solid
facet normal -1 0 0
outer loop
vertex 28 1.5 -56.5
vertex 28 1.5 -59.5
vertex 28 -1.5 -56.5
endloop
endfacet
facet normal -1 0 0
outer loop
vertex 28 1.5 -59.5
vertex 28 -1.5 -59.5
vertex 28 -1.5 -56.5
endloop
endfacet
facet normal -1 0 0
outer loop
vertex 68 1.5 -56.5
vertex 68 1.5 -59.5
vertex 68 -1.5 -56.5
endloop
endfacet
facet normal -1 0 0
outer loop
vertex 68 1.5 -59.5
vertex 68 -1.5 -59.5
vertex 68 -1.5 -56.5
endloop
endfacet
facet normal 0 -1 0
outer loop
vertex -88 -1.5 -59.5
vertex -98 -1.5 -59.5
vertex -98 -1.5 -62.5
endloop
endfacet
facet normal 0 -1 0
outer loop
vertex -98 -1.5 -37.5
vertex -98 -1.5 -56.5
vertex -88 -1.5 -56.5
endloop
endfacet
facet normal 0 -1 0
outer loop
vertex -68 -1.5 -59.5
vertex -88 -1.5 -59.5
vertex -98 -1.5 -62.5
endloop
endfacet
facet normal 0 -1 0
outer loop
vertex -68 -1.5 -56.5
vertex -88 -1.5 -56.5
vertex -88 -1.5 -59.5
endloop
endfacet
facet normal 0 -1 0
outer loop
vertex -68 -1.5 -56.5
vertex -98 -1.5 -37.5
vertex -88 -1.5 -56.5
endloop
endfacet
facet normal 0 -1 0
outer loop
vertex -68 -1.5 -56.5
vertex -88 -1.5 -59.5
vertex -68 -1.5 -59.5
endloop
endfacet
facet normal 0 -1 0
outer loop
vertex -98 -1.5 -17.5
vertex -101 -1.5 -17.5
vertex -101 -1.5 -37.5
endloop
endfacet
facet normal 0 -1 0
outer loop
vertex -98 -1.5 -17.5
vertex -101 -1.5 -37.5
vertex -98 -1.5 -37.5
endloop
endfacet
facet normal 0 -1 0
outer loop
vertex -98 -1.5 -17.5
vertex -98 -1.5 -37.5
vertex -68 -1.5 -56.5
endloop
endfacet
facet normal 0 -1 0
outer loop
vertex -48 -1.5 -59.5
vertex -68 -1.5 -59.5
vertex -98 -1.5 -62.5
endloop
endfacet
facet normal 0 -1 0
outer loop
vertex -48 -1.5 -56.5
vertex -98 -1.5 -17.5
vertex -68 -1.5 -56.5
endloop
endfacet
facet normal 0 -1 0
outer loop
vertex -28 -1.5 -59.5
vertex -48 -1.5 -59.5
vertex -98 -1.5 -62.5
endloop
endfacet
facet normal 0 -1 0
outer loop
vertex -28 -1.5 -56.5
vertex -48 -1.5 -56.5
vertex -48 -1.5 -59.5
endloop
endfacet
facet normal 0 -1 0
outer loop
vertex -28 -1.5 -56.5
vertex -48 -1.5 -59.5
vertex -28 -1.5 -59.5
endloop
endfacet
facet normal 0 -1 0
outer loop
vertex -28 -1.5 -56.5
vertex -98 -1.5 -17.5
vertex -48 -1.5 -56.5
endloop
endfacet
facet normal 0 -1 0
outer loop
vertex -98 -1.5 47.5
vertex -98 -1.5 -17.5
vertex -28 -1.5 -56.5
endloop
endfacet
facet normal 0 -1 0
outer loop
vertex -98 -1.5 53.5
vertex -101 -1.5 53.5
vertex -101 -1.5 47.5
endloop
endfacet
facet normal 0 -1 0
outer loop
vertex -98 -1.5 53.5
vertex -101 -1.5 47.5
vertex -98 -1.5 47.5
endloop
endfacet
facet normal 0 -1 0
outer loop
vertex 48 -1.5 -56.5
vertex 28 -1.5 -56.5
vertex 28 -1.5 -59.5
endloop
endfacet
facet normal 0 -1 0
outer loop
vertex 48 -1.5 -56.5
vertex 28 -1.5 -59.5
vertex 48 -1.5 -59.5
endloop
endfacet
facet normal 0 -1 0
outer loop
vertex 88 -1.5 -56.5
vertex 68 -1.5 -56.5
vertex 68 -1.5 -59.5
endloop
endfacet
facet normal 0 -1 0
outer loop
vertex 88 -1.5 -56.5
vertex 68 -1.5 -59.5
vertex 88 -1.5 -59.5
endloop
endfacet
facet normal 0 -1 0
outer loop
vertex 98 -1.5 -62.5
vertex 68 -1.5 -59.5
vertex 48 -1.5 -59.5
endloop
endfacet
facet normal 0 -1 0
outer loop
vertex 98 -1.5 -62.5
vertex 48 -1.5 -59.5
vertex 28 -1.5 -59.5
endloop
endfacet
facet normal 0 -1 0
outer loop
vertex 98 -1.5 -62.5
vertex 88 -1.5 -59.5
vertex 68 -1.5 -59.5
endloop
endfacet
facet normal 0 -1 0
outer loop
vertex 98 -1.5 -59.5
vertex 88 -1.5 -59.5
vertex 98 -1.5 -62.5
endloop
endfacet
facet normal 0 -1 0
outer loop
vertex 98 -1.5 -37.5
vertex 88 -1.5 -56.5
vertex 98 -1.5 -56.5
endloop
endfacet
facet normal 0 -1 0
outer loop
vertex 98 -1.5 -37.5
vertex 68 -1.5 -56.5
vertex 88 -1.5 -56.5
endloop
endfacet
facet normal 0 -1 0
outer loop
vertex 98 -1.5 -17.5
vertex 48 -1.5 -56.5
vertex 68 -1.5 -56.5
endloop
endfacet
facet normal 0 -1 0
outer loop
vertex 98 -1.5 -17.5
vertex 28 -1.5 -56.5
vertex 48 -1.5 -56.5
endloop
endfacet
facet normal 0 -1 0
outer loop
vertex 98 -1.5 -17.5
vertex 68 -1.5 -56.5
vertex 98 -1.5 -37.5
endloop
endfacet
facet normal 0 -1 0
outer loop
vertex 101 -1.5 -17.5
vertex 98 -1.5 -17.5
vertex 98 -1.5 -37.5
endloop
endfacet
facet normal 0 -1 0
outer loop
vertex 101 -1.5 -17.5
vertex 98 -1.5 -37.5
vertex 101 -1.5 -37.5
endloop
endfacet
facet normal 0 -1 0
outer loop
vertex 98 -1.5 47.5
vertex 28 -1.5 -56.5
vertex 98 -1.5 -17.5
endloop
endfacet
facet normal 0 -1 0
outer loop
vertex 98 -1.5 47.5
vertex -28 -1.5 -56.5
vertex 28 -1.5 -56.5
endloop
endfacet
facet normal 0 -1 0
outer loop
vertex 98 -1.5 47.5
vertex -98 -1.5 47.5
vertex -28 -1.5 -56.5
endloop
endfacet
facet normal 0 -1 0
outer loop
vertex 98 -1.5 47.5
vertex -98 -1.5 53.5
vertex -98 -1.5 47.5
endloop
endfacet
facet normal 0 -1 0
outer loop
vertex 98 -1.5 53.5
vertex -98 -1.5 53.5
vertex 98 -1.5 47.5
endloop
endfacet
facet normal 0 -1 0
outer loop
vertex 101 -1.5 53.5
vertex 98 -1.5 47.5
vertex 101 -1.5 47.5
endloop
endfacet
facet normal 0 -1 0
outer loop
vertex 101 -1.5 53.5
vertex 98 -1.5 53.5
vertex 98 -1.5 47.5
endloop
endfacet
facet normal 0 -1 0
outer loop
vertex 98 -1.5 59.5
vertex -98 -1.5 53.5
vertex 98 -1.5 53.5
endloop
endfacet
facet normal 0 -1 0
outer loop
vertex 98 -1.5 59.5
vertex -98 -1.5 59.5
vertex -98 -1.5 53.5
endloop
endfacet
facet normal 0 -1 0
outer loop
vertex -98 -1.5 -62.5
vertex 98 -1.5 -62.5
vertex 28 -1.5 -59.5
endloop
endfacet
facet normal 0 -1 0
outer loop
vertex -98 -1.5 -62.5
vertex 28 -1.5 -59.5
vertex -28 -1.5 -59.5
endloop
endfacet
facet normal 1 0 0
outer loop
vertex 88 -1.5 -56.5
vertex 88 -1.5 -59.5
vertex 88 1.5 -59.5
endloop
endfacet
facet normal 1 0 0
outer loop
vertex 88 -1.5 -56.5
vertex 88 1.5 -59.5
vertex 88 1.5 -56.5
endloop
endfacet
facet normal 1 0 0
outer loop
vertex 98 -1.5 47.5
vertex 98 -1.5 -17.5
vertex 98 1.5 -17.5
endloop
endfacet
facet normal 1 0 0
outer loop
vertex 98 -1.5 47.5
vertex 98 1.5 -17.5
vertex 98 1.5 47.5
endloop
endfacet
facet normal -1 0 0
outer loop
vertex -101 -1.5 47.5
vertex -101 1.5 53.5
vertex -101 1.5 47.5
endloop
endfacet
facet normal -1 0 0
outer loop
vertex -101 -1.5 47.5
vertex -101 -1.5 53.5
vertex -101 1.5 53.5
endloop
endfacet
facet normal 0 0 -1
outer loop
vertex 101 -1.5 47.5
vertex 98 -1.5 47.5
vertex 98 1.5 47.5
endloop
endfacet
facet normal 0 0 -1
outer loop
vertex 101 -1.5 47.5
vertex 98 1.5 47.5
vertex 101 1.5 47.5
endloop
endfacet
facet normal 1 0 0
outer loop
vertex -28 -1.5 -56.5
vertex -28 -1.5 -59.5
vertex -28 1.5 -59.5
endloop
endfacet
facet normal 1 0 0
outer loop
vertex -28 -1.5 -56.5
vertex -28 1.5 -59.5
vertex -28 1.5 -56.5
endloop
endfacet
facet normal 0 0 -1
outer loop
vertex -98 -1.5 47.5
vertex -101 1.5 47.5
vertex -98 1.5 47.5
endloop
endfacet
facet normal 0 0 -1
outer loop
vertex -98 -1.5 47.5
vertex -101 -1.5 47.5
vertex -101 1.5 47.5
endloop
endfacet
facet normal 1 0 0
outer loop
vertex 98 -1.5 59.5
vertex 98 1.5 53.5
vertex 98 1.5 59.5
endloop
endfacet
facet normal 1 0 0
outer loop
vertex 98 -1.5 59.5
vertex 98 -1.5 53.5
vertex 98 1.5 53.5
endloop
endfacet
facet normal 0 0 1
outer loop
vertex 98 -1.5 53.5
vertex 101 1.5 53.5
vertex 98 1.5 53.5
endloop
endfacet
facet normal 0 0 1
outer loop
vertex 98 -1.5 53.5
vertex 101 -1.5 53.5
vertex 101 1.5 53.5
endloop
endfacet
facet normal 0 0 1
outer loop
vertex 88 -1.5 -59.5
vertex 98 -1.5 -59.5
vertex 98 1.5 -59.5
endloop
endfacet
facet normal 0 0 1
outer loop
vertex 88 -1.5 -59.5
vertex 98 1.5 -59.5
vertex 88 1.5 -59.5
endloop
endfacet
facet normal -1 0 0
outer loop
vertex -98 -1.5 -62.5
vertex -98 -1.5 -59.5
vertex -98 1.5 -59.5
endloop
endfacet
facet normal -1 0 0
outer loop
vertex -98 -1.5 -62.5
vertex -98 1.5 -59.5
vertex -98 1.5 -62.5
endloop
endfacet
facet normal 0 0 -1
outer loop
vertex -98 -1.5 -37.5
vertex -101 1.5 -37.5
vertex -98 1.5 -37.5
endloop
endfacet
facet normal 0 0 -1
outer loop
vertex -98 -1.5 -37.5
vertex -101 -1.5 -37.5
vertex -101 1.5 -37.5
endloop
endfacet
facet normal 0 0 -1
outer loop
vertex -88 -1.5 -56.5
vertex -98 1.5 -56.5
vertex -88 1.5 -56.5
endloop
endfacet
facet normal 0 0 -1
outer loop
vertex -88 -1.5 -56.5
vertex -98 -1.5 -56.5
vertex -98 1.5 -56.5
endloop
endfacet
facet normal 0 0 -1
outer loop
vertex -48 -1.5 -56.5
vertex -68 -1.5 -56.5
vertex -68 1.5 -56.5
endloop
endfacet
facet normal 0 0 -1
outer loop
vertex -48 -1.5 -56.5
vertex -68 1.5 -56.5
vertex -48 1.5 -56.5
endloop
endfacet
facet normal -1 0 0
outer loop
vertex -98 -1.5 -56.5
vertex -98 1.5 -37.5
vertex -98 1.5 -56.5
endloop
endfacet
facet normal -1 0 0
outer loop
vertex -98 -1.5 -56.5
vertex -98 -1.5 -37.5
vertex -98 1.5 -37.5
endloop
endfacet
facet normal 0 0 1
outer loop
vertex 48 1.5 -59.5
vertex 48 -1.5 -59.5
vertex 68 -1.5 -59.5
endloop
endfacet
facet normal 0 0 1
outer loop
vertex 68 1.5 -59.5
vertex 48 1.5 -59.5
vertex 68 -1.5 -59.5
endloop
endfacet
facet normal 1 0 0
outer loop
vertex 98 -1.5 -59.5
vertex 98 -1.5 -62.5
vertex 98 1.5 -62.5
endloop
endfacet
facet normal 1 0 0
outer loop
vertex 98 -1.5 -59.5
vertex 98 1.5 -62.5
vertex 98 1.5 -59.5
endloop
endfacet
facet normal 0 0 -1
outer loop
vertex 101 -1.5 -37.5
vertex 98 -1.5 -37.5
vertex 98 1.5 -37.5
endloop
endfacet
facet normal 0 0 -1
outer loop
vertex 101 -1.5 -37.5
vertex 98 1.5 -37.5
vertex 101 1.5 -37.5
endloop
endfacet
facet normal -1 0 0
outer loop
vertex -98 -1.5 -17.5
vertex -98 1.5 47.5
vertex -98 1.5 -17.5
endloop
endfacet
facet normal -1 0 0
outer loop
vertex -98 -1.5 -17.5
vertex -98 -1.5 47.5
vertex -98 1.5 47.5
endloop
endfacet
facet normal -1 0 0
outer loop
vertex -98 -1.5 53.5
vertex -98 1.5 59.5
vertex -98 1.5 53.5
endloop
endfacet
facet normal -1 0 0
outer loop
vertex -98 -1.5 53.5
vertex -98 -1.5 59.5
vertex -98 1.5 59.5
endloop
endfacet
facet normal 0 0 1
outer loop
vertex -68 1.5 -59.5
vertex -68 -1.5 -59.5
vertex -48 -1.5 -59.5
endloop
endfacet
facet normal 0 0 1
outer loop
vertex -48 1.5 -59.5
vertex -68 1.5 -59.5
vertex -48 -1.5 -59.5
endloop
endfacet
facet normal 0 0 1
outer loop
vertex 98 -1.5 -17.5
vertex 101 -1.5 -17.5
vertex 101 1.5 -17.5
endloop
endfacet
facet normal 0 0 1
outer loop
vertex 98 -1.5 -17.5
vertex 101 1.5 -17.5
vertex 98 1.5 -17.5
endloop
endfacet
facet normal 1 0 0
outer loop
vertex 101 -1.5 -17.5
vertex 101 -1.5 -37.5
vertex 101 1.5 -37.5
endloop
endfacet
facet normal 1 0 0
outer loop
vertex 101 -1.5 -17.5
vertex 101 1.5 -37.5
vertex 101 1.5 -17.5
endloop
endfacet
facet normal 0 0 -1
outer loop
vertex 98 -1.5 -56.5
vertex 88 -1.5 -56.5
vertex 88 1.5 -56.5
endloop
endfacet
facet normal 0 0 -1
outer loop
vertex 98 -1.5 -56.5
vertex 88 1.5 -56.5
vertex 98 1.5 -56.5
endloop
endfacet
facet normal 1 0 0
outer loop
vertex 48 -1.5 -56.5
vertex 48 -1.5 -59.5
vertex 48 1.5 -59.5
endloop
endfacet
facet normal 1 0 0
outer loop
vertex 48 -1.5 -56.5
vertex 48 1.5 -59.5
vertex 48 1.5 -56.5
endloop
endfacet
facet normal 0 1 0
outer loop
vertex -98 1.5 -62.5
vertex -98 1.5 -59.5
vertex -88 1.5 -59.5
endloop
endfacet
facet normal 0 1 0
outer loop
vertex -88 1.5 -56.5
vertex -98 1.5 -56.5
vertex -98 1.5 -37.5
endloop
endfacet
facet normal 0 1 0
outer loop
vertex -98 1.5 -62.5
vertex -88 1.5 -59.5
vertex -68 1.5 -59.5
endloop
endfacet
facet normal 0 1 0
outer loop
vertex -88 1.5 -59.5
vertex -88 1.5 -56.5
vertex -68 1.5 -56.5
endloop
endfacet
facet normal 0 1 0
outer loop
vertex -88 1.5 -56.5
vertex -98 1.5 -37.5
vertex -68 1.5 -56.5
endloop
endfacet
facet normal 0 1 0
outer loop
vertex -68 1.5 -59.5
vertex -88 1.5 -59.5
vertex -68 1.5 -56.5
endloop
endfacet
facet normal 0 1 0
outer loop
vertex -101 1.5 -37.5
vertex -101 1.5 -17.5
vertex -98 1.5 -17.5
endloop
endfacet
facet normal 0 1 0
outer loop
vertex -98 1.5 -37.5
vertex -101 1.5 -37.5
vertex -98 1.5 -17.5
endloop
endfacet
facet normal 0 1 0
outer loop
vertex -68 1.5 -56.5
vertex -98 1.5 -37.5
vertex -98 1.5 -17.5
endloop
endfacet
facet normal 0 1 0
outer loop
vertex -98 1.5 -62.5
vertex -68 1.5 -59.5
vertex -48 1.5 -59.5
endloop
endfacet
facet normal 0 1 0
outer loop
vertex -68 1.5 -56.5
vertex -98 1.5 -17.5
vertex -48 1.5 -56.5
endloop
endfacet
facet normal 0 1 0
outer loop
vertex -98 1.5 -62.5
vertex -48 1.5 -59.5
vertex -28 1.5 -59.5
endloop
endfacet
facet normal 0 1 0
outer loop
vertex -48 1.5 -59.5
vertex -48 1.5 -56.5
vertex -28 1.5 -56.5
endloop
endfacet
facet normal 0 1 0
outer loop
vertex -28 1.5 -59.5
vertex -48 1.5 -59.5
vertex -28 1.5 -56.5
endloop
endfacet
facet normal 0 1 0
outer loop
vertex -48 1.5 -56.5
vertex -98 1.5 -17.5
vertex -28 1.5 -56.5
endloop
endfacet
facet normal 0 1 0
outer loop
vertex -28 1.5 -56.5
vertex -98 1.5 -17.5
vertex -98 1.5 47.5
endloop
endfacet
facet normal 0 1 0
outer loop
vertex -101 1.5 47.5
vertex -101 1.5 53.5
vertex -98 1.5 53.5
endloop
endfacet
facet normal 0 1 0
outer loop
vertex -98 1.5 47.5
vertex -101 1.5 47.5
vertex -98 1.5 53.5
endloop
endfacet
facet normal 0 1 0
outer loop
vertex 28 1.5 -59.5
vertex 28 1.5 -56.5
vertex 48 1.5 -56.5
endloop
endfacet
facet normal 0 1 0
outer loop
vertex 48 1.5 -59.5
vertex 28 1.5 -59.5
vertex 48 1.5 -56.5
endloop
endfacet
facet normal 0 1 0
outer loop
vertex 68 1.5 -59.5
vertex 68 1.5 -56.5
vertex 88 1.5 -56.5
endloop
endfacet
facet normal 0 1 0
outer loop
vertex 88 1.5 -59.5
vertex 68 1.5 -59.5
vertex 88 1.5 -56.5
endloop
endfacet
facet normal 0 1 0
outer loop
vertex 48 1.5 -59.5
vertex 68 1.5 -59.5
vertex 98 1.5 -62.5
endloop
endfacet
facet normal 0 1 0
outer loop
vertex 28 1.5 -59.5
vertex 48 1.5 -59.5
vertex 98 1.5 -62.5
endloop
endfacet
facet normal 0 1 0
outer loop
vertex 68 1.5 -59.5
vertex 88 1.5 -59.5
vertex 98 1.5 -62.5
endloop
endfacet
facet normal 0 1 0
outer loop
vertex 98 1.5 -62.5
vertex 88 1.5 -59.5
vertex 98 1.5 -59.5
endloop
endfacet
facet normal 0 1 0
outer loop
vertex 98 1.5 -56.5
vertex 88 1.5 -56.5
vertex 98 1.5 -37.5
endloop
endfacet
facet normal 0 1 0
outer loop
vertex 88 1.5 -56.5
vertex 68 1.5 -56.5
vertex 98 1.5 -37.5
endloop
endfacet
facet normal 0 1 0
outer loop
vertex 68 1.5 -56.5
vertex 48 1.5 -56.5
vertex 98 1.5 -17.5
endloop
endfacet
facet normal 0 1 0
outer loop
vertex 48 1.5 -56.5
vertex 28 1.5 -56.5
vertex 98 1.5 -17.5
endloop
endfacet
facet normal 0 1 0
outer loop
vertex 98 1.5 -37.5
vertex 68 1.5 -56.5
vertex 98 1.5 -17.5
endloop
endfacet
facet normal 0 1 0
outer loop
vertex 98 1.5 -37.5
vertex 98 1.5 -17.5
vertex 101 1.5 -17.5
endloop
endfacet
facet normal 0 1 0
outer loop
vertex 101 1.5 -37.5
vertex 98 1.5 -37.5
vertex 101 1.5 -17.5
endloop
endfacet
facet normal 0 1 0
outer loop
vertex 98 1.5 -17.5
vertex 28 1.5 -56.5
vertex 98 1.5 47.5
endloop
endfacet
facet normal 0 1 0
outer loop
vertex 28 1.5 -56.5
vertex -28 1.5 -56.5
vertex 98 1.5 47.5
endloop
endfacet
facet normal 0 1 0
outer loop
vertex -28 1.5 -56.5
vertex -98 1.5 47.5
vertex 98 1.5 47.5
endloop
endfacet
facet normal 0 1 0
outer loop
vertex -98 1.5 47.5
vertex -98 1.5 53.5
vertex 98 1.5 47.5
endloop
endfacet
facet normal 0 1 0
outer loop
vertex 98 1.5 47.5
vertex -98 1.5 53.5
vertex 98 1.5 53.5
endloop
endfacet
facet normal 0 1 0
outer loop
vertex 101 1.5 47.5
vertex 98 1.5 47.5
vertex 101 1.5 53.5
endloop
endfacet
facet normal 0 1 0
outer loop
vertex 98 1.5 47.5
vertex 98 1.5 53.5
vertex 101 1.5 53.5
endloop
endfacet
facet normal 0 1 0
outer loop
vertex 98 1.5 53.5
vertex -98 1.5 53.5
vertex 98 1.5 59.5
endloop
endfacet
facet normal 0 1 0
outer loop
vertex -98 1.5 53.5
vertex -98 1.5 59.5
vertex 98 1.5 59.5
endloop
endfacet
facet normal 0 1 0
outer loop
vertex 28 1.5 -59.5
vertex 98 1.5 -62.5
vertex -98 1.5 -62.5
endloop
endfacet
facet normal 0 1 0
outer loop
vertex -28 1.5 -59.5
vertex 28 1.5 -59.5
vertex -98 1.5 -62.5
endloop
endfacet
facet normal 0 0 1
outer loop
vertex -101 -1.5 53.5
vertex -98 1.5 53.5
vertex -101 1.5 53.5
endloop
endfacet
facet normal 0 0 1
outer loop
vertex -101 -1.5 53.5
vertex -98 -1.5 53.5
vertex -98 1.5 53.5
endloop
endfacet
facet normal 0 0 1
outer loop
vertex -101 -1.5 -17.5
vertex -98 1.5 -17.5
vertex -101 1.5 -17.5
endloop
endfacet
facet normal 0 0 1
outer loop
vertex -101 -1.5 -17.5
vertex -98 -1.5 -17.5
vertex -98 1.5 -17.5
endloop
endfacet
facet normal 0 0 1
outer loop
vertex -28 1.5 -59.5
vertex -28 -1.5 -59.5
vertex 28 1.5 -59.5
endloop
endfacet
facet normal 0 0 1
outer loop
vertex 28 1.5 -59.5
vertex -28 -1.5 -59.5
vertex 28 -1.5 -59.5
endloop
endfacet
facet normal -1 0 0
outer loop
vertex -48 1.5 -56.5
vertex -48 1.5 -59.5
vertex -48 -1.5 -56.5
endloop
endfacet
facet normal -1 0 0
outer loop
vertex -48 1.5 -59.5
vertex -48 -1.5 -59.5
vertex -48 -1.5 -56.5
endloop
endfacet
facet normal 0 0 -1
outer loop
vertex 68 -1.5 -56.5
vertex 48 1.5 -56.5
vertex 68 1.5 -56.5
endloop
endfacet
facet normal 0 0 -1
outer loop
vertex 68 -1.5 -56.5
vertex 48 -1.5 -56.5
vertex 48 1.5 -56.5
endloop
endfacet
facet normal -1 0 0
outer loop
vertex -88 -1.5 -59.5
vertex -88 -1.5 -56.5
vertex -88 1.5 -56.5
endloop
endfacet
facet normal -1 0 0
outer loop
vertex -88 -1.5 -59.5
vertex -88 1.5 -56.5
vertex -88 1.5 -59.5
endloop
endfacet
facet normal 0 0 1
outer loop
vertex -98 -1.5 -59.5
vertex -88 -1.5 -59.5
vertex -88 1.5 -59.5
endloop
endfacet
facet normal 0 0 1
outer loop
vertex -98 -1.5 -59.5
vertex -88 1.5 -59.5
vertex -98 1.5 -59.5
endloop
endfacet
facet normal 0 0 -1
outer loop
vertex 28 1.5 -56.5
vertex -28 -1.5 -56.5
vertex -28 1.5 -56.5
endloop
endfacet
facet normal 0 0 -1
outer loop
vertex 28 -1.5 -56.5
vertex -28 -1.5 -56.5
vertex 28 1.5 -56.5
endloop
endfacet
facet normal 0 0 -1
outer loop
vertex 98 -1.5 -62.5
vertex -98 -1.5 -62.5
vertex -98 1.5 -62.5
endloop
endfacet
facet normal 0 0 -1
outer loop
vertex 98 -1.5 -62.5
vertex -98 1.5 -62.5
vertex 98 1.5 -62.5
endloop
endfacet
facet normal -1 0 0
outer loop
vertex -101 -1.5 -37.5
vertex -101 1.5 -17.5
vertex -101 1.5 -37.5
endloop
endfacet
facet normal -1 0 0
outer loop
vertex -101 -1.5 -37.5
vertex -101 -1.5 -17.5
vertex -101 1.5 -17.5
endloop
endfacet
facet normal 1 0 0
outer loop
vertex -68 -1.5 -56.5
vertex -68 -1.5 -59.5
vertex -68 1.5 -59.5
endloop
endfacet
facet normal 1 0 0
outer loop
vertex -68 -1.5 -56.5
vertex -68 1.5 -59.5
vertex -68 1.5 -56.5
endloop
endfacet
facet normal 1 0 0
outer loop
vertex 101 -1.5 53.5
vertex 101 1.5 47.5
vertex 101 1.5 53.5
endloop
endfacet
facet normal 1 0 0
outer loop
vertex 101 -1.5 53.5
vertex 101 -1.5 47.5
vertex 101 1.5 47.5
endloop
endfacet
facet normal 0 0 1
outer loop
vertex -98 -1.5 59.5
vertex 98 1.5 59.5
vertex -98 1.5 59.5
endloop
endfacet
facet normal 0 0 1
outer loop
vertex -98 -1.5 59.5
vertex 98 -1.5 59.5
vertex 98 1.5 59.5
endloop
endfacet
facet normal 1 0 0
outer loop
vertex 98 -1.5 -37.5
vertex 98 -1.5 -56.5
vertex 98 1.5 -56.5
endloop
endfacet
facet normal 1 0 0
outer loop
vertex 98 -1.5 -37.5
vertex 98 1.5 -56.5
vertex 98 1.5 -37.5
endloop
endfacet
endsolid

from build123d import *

# Parameters (mm, degrees)
F0_W     = 20
F0_H     = 3
F0_W_2   = 56
F1_DEPTH = 1.5


with BuildPart() as f1:
    # F0 (on Front) → F1 (new body, symmetric)
    with BuildSketch(Plane.XZ):
        Polygon((-98, -56.5), (-88, -56.5), (-88, -59.5), (-98, -59.5), (-98, -62.5), (0, -62.5), (98, -62.5), (98, -59.5), (88, -59.5), (88, -56.5), (98, -56.5), (98, -37.5), (101, -37.5), (101, -17.5), (98, -17.5), (98, 47.5), (101, 47.5), (101, 53.5), (98, 53.5), (98, 59.5), (0, 59.5), (-98, 59.5), (-98, 53.5), (-101, 53.5), (-101, 47.5), (-98, 47.5), (-98, -17.5), (-101, -17.5), (-101, -37.5), (-98, -37.5), align=None)
        with Locations((-58, -58)):
            Rectangle(F0_W, F0_H, mode=Mode.SUBTRACT)
        with Locations((0, -58)):
            Rectangle(F0_W_2, F0_H, mode=Mode.SUBTRACT)
        with Locations((58, -58)):
            Rectangle(F0_W, F0_H, mode=Mode.SUBTRACT)
    extrude(amount=F1_DEPTH, both=True)


solid = f1.part
